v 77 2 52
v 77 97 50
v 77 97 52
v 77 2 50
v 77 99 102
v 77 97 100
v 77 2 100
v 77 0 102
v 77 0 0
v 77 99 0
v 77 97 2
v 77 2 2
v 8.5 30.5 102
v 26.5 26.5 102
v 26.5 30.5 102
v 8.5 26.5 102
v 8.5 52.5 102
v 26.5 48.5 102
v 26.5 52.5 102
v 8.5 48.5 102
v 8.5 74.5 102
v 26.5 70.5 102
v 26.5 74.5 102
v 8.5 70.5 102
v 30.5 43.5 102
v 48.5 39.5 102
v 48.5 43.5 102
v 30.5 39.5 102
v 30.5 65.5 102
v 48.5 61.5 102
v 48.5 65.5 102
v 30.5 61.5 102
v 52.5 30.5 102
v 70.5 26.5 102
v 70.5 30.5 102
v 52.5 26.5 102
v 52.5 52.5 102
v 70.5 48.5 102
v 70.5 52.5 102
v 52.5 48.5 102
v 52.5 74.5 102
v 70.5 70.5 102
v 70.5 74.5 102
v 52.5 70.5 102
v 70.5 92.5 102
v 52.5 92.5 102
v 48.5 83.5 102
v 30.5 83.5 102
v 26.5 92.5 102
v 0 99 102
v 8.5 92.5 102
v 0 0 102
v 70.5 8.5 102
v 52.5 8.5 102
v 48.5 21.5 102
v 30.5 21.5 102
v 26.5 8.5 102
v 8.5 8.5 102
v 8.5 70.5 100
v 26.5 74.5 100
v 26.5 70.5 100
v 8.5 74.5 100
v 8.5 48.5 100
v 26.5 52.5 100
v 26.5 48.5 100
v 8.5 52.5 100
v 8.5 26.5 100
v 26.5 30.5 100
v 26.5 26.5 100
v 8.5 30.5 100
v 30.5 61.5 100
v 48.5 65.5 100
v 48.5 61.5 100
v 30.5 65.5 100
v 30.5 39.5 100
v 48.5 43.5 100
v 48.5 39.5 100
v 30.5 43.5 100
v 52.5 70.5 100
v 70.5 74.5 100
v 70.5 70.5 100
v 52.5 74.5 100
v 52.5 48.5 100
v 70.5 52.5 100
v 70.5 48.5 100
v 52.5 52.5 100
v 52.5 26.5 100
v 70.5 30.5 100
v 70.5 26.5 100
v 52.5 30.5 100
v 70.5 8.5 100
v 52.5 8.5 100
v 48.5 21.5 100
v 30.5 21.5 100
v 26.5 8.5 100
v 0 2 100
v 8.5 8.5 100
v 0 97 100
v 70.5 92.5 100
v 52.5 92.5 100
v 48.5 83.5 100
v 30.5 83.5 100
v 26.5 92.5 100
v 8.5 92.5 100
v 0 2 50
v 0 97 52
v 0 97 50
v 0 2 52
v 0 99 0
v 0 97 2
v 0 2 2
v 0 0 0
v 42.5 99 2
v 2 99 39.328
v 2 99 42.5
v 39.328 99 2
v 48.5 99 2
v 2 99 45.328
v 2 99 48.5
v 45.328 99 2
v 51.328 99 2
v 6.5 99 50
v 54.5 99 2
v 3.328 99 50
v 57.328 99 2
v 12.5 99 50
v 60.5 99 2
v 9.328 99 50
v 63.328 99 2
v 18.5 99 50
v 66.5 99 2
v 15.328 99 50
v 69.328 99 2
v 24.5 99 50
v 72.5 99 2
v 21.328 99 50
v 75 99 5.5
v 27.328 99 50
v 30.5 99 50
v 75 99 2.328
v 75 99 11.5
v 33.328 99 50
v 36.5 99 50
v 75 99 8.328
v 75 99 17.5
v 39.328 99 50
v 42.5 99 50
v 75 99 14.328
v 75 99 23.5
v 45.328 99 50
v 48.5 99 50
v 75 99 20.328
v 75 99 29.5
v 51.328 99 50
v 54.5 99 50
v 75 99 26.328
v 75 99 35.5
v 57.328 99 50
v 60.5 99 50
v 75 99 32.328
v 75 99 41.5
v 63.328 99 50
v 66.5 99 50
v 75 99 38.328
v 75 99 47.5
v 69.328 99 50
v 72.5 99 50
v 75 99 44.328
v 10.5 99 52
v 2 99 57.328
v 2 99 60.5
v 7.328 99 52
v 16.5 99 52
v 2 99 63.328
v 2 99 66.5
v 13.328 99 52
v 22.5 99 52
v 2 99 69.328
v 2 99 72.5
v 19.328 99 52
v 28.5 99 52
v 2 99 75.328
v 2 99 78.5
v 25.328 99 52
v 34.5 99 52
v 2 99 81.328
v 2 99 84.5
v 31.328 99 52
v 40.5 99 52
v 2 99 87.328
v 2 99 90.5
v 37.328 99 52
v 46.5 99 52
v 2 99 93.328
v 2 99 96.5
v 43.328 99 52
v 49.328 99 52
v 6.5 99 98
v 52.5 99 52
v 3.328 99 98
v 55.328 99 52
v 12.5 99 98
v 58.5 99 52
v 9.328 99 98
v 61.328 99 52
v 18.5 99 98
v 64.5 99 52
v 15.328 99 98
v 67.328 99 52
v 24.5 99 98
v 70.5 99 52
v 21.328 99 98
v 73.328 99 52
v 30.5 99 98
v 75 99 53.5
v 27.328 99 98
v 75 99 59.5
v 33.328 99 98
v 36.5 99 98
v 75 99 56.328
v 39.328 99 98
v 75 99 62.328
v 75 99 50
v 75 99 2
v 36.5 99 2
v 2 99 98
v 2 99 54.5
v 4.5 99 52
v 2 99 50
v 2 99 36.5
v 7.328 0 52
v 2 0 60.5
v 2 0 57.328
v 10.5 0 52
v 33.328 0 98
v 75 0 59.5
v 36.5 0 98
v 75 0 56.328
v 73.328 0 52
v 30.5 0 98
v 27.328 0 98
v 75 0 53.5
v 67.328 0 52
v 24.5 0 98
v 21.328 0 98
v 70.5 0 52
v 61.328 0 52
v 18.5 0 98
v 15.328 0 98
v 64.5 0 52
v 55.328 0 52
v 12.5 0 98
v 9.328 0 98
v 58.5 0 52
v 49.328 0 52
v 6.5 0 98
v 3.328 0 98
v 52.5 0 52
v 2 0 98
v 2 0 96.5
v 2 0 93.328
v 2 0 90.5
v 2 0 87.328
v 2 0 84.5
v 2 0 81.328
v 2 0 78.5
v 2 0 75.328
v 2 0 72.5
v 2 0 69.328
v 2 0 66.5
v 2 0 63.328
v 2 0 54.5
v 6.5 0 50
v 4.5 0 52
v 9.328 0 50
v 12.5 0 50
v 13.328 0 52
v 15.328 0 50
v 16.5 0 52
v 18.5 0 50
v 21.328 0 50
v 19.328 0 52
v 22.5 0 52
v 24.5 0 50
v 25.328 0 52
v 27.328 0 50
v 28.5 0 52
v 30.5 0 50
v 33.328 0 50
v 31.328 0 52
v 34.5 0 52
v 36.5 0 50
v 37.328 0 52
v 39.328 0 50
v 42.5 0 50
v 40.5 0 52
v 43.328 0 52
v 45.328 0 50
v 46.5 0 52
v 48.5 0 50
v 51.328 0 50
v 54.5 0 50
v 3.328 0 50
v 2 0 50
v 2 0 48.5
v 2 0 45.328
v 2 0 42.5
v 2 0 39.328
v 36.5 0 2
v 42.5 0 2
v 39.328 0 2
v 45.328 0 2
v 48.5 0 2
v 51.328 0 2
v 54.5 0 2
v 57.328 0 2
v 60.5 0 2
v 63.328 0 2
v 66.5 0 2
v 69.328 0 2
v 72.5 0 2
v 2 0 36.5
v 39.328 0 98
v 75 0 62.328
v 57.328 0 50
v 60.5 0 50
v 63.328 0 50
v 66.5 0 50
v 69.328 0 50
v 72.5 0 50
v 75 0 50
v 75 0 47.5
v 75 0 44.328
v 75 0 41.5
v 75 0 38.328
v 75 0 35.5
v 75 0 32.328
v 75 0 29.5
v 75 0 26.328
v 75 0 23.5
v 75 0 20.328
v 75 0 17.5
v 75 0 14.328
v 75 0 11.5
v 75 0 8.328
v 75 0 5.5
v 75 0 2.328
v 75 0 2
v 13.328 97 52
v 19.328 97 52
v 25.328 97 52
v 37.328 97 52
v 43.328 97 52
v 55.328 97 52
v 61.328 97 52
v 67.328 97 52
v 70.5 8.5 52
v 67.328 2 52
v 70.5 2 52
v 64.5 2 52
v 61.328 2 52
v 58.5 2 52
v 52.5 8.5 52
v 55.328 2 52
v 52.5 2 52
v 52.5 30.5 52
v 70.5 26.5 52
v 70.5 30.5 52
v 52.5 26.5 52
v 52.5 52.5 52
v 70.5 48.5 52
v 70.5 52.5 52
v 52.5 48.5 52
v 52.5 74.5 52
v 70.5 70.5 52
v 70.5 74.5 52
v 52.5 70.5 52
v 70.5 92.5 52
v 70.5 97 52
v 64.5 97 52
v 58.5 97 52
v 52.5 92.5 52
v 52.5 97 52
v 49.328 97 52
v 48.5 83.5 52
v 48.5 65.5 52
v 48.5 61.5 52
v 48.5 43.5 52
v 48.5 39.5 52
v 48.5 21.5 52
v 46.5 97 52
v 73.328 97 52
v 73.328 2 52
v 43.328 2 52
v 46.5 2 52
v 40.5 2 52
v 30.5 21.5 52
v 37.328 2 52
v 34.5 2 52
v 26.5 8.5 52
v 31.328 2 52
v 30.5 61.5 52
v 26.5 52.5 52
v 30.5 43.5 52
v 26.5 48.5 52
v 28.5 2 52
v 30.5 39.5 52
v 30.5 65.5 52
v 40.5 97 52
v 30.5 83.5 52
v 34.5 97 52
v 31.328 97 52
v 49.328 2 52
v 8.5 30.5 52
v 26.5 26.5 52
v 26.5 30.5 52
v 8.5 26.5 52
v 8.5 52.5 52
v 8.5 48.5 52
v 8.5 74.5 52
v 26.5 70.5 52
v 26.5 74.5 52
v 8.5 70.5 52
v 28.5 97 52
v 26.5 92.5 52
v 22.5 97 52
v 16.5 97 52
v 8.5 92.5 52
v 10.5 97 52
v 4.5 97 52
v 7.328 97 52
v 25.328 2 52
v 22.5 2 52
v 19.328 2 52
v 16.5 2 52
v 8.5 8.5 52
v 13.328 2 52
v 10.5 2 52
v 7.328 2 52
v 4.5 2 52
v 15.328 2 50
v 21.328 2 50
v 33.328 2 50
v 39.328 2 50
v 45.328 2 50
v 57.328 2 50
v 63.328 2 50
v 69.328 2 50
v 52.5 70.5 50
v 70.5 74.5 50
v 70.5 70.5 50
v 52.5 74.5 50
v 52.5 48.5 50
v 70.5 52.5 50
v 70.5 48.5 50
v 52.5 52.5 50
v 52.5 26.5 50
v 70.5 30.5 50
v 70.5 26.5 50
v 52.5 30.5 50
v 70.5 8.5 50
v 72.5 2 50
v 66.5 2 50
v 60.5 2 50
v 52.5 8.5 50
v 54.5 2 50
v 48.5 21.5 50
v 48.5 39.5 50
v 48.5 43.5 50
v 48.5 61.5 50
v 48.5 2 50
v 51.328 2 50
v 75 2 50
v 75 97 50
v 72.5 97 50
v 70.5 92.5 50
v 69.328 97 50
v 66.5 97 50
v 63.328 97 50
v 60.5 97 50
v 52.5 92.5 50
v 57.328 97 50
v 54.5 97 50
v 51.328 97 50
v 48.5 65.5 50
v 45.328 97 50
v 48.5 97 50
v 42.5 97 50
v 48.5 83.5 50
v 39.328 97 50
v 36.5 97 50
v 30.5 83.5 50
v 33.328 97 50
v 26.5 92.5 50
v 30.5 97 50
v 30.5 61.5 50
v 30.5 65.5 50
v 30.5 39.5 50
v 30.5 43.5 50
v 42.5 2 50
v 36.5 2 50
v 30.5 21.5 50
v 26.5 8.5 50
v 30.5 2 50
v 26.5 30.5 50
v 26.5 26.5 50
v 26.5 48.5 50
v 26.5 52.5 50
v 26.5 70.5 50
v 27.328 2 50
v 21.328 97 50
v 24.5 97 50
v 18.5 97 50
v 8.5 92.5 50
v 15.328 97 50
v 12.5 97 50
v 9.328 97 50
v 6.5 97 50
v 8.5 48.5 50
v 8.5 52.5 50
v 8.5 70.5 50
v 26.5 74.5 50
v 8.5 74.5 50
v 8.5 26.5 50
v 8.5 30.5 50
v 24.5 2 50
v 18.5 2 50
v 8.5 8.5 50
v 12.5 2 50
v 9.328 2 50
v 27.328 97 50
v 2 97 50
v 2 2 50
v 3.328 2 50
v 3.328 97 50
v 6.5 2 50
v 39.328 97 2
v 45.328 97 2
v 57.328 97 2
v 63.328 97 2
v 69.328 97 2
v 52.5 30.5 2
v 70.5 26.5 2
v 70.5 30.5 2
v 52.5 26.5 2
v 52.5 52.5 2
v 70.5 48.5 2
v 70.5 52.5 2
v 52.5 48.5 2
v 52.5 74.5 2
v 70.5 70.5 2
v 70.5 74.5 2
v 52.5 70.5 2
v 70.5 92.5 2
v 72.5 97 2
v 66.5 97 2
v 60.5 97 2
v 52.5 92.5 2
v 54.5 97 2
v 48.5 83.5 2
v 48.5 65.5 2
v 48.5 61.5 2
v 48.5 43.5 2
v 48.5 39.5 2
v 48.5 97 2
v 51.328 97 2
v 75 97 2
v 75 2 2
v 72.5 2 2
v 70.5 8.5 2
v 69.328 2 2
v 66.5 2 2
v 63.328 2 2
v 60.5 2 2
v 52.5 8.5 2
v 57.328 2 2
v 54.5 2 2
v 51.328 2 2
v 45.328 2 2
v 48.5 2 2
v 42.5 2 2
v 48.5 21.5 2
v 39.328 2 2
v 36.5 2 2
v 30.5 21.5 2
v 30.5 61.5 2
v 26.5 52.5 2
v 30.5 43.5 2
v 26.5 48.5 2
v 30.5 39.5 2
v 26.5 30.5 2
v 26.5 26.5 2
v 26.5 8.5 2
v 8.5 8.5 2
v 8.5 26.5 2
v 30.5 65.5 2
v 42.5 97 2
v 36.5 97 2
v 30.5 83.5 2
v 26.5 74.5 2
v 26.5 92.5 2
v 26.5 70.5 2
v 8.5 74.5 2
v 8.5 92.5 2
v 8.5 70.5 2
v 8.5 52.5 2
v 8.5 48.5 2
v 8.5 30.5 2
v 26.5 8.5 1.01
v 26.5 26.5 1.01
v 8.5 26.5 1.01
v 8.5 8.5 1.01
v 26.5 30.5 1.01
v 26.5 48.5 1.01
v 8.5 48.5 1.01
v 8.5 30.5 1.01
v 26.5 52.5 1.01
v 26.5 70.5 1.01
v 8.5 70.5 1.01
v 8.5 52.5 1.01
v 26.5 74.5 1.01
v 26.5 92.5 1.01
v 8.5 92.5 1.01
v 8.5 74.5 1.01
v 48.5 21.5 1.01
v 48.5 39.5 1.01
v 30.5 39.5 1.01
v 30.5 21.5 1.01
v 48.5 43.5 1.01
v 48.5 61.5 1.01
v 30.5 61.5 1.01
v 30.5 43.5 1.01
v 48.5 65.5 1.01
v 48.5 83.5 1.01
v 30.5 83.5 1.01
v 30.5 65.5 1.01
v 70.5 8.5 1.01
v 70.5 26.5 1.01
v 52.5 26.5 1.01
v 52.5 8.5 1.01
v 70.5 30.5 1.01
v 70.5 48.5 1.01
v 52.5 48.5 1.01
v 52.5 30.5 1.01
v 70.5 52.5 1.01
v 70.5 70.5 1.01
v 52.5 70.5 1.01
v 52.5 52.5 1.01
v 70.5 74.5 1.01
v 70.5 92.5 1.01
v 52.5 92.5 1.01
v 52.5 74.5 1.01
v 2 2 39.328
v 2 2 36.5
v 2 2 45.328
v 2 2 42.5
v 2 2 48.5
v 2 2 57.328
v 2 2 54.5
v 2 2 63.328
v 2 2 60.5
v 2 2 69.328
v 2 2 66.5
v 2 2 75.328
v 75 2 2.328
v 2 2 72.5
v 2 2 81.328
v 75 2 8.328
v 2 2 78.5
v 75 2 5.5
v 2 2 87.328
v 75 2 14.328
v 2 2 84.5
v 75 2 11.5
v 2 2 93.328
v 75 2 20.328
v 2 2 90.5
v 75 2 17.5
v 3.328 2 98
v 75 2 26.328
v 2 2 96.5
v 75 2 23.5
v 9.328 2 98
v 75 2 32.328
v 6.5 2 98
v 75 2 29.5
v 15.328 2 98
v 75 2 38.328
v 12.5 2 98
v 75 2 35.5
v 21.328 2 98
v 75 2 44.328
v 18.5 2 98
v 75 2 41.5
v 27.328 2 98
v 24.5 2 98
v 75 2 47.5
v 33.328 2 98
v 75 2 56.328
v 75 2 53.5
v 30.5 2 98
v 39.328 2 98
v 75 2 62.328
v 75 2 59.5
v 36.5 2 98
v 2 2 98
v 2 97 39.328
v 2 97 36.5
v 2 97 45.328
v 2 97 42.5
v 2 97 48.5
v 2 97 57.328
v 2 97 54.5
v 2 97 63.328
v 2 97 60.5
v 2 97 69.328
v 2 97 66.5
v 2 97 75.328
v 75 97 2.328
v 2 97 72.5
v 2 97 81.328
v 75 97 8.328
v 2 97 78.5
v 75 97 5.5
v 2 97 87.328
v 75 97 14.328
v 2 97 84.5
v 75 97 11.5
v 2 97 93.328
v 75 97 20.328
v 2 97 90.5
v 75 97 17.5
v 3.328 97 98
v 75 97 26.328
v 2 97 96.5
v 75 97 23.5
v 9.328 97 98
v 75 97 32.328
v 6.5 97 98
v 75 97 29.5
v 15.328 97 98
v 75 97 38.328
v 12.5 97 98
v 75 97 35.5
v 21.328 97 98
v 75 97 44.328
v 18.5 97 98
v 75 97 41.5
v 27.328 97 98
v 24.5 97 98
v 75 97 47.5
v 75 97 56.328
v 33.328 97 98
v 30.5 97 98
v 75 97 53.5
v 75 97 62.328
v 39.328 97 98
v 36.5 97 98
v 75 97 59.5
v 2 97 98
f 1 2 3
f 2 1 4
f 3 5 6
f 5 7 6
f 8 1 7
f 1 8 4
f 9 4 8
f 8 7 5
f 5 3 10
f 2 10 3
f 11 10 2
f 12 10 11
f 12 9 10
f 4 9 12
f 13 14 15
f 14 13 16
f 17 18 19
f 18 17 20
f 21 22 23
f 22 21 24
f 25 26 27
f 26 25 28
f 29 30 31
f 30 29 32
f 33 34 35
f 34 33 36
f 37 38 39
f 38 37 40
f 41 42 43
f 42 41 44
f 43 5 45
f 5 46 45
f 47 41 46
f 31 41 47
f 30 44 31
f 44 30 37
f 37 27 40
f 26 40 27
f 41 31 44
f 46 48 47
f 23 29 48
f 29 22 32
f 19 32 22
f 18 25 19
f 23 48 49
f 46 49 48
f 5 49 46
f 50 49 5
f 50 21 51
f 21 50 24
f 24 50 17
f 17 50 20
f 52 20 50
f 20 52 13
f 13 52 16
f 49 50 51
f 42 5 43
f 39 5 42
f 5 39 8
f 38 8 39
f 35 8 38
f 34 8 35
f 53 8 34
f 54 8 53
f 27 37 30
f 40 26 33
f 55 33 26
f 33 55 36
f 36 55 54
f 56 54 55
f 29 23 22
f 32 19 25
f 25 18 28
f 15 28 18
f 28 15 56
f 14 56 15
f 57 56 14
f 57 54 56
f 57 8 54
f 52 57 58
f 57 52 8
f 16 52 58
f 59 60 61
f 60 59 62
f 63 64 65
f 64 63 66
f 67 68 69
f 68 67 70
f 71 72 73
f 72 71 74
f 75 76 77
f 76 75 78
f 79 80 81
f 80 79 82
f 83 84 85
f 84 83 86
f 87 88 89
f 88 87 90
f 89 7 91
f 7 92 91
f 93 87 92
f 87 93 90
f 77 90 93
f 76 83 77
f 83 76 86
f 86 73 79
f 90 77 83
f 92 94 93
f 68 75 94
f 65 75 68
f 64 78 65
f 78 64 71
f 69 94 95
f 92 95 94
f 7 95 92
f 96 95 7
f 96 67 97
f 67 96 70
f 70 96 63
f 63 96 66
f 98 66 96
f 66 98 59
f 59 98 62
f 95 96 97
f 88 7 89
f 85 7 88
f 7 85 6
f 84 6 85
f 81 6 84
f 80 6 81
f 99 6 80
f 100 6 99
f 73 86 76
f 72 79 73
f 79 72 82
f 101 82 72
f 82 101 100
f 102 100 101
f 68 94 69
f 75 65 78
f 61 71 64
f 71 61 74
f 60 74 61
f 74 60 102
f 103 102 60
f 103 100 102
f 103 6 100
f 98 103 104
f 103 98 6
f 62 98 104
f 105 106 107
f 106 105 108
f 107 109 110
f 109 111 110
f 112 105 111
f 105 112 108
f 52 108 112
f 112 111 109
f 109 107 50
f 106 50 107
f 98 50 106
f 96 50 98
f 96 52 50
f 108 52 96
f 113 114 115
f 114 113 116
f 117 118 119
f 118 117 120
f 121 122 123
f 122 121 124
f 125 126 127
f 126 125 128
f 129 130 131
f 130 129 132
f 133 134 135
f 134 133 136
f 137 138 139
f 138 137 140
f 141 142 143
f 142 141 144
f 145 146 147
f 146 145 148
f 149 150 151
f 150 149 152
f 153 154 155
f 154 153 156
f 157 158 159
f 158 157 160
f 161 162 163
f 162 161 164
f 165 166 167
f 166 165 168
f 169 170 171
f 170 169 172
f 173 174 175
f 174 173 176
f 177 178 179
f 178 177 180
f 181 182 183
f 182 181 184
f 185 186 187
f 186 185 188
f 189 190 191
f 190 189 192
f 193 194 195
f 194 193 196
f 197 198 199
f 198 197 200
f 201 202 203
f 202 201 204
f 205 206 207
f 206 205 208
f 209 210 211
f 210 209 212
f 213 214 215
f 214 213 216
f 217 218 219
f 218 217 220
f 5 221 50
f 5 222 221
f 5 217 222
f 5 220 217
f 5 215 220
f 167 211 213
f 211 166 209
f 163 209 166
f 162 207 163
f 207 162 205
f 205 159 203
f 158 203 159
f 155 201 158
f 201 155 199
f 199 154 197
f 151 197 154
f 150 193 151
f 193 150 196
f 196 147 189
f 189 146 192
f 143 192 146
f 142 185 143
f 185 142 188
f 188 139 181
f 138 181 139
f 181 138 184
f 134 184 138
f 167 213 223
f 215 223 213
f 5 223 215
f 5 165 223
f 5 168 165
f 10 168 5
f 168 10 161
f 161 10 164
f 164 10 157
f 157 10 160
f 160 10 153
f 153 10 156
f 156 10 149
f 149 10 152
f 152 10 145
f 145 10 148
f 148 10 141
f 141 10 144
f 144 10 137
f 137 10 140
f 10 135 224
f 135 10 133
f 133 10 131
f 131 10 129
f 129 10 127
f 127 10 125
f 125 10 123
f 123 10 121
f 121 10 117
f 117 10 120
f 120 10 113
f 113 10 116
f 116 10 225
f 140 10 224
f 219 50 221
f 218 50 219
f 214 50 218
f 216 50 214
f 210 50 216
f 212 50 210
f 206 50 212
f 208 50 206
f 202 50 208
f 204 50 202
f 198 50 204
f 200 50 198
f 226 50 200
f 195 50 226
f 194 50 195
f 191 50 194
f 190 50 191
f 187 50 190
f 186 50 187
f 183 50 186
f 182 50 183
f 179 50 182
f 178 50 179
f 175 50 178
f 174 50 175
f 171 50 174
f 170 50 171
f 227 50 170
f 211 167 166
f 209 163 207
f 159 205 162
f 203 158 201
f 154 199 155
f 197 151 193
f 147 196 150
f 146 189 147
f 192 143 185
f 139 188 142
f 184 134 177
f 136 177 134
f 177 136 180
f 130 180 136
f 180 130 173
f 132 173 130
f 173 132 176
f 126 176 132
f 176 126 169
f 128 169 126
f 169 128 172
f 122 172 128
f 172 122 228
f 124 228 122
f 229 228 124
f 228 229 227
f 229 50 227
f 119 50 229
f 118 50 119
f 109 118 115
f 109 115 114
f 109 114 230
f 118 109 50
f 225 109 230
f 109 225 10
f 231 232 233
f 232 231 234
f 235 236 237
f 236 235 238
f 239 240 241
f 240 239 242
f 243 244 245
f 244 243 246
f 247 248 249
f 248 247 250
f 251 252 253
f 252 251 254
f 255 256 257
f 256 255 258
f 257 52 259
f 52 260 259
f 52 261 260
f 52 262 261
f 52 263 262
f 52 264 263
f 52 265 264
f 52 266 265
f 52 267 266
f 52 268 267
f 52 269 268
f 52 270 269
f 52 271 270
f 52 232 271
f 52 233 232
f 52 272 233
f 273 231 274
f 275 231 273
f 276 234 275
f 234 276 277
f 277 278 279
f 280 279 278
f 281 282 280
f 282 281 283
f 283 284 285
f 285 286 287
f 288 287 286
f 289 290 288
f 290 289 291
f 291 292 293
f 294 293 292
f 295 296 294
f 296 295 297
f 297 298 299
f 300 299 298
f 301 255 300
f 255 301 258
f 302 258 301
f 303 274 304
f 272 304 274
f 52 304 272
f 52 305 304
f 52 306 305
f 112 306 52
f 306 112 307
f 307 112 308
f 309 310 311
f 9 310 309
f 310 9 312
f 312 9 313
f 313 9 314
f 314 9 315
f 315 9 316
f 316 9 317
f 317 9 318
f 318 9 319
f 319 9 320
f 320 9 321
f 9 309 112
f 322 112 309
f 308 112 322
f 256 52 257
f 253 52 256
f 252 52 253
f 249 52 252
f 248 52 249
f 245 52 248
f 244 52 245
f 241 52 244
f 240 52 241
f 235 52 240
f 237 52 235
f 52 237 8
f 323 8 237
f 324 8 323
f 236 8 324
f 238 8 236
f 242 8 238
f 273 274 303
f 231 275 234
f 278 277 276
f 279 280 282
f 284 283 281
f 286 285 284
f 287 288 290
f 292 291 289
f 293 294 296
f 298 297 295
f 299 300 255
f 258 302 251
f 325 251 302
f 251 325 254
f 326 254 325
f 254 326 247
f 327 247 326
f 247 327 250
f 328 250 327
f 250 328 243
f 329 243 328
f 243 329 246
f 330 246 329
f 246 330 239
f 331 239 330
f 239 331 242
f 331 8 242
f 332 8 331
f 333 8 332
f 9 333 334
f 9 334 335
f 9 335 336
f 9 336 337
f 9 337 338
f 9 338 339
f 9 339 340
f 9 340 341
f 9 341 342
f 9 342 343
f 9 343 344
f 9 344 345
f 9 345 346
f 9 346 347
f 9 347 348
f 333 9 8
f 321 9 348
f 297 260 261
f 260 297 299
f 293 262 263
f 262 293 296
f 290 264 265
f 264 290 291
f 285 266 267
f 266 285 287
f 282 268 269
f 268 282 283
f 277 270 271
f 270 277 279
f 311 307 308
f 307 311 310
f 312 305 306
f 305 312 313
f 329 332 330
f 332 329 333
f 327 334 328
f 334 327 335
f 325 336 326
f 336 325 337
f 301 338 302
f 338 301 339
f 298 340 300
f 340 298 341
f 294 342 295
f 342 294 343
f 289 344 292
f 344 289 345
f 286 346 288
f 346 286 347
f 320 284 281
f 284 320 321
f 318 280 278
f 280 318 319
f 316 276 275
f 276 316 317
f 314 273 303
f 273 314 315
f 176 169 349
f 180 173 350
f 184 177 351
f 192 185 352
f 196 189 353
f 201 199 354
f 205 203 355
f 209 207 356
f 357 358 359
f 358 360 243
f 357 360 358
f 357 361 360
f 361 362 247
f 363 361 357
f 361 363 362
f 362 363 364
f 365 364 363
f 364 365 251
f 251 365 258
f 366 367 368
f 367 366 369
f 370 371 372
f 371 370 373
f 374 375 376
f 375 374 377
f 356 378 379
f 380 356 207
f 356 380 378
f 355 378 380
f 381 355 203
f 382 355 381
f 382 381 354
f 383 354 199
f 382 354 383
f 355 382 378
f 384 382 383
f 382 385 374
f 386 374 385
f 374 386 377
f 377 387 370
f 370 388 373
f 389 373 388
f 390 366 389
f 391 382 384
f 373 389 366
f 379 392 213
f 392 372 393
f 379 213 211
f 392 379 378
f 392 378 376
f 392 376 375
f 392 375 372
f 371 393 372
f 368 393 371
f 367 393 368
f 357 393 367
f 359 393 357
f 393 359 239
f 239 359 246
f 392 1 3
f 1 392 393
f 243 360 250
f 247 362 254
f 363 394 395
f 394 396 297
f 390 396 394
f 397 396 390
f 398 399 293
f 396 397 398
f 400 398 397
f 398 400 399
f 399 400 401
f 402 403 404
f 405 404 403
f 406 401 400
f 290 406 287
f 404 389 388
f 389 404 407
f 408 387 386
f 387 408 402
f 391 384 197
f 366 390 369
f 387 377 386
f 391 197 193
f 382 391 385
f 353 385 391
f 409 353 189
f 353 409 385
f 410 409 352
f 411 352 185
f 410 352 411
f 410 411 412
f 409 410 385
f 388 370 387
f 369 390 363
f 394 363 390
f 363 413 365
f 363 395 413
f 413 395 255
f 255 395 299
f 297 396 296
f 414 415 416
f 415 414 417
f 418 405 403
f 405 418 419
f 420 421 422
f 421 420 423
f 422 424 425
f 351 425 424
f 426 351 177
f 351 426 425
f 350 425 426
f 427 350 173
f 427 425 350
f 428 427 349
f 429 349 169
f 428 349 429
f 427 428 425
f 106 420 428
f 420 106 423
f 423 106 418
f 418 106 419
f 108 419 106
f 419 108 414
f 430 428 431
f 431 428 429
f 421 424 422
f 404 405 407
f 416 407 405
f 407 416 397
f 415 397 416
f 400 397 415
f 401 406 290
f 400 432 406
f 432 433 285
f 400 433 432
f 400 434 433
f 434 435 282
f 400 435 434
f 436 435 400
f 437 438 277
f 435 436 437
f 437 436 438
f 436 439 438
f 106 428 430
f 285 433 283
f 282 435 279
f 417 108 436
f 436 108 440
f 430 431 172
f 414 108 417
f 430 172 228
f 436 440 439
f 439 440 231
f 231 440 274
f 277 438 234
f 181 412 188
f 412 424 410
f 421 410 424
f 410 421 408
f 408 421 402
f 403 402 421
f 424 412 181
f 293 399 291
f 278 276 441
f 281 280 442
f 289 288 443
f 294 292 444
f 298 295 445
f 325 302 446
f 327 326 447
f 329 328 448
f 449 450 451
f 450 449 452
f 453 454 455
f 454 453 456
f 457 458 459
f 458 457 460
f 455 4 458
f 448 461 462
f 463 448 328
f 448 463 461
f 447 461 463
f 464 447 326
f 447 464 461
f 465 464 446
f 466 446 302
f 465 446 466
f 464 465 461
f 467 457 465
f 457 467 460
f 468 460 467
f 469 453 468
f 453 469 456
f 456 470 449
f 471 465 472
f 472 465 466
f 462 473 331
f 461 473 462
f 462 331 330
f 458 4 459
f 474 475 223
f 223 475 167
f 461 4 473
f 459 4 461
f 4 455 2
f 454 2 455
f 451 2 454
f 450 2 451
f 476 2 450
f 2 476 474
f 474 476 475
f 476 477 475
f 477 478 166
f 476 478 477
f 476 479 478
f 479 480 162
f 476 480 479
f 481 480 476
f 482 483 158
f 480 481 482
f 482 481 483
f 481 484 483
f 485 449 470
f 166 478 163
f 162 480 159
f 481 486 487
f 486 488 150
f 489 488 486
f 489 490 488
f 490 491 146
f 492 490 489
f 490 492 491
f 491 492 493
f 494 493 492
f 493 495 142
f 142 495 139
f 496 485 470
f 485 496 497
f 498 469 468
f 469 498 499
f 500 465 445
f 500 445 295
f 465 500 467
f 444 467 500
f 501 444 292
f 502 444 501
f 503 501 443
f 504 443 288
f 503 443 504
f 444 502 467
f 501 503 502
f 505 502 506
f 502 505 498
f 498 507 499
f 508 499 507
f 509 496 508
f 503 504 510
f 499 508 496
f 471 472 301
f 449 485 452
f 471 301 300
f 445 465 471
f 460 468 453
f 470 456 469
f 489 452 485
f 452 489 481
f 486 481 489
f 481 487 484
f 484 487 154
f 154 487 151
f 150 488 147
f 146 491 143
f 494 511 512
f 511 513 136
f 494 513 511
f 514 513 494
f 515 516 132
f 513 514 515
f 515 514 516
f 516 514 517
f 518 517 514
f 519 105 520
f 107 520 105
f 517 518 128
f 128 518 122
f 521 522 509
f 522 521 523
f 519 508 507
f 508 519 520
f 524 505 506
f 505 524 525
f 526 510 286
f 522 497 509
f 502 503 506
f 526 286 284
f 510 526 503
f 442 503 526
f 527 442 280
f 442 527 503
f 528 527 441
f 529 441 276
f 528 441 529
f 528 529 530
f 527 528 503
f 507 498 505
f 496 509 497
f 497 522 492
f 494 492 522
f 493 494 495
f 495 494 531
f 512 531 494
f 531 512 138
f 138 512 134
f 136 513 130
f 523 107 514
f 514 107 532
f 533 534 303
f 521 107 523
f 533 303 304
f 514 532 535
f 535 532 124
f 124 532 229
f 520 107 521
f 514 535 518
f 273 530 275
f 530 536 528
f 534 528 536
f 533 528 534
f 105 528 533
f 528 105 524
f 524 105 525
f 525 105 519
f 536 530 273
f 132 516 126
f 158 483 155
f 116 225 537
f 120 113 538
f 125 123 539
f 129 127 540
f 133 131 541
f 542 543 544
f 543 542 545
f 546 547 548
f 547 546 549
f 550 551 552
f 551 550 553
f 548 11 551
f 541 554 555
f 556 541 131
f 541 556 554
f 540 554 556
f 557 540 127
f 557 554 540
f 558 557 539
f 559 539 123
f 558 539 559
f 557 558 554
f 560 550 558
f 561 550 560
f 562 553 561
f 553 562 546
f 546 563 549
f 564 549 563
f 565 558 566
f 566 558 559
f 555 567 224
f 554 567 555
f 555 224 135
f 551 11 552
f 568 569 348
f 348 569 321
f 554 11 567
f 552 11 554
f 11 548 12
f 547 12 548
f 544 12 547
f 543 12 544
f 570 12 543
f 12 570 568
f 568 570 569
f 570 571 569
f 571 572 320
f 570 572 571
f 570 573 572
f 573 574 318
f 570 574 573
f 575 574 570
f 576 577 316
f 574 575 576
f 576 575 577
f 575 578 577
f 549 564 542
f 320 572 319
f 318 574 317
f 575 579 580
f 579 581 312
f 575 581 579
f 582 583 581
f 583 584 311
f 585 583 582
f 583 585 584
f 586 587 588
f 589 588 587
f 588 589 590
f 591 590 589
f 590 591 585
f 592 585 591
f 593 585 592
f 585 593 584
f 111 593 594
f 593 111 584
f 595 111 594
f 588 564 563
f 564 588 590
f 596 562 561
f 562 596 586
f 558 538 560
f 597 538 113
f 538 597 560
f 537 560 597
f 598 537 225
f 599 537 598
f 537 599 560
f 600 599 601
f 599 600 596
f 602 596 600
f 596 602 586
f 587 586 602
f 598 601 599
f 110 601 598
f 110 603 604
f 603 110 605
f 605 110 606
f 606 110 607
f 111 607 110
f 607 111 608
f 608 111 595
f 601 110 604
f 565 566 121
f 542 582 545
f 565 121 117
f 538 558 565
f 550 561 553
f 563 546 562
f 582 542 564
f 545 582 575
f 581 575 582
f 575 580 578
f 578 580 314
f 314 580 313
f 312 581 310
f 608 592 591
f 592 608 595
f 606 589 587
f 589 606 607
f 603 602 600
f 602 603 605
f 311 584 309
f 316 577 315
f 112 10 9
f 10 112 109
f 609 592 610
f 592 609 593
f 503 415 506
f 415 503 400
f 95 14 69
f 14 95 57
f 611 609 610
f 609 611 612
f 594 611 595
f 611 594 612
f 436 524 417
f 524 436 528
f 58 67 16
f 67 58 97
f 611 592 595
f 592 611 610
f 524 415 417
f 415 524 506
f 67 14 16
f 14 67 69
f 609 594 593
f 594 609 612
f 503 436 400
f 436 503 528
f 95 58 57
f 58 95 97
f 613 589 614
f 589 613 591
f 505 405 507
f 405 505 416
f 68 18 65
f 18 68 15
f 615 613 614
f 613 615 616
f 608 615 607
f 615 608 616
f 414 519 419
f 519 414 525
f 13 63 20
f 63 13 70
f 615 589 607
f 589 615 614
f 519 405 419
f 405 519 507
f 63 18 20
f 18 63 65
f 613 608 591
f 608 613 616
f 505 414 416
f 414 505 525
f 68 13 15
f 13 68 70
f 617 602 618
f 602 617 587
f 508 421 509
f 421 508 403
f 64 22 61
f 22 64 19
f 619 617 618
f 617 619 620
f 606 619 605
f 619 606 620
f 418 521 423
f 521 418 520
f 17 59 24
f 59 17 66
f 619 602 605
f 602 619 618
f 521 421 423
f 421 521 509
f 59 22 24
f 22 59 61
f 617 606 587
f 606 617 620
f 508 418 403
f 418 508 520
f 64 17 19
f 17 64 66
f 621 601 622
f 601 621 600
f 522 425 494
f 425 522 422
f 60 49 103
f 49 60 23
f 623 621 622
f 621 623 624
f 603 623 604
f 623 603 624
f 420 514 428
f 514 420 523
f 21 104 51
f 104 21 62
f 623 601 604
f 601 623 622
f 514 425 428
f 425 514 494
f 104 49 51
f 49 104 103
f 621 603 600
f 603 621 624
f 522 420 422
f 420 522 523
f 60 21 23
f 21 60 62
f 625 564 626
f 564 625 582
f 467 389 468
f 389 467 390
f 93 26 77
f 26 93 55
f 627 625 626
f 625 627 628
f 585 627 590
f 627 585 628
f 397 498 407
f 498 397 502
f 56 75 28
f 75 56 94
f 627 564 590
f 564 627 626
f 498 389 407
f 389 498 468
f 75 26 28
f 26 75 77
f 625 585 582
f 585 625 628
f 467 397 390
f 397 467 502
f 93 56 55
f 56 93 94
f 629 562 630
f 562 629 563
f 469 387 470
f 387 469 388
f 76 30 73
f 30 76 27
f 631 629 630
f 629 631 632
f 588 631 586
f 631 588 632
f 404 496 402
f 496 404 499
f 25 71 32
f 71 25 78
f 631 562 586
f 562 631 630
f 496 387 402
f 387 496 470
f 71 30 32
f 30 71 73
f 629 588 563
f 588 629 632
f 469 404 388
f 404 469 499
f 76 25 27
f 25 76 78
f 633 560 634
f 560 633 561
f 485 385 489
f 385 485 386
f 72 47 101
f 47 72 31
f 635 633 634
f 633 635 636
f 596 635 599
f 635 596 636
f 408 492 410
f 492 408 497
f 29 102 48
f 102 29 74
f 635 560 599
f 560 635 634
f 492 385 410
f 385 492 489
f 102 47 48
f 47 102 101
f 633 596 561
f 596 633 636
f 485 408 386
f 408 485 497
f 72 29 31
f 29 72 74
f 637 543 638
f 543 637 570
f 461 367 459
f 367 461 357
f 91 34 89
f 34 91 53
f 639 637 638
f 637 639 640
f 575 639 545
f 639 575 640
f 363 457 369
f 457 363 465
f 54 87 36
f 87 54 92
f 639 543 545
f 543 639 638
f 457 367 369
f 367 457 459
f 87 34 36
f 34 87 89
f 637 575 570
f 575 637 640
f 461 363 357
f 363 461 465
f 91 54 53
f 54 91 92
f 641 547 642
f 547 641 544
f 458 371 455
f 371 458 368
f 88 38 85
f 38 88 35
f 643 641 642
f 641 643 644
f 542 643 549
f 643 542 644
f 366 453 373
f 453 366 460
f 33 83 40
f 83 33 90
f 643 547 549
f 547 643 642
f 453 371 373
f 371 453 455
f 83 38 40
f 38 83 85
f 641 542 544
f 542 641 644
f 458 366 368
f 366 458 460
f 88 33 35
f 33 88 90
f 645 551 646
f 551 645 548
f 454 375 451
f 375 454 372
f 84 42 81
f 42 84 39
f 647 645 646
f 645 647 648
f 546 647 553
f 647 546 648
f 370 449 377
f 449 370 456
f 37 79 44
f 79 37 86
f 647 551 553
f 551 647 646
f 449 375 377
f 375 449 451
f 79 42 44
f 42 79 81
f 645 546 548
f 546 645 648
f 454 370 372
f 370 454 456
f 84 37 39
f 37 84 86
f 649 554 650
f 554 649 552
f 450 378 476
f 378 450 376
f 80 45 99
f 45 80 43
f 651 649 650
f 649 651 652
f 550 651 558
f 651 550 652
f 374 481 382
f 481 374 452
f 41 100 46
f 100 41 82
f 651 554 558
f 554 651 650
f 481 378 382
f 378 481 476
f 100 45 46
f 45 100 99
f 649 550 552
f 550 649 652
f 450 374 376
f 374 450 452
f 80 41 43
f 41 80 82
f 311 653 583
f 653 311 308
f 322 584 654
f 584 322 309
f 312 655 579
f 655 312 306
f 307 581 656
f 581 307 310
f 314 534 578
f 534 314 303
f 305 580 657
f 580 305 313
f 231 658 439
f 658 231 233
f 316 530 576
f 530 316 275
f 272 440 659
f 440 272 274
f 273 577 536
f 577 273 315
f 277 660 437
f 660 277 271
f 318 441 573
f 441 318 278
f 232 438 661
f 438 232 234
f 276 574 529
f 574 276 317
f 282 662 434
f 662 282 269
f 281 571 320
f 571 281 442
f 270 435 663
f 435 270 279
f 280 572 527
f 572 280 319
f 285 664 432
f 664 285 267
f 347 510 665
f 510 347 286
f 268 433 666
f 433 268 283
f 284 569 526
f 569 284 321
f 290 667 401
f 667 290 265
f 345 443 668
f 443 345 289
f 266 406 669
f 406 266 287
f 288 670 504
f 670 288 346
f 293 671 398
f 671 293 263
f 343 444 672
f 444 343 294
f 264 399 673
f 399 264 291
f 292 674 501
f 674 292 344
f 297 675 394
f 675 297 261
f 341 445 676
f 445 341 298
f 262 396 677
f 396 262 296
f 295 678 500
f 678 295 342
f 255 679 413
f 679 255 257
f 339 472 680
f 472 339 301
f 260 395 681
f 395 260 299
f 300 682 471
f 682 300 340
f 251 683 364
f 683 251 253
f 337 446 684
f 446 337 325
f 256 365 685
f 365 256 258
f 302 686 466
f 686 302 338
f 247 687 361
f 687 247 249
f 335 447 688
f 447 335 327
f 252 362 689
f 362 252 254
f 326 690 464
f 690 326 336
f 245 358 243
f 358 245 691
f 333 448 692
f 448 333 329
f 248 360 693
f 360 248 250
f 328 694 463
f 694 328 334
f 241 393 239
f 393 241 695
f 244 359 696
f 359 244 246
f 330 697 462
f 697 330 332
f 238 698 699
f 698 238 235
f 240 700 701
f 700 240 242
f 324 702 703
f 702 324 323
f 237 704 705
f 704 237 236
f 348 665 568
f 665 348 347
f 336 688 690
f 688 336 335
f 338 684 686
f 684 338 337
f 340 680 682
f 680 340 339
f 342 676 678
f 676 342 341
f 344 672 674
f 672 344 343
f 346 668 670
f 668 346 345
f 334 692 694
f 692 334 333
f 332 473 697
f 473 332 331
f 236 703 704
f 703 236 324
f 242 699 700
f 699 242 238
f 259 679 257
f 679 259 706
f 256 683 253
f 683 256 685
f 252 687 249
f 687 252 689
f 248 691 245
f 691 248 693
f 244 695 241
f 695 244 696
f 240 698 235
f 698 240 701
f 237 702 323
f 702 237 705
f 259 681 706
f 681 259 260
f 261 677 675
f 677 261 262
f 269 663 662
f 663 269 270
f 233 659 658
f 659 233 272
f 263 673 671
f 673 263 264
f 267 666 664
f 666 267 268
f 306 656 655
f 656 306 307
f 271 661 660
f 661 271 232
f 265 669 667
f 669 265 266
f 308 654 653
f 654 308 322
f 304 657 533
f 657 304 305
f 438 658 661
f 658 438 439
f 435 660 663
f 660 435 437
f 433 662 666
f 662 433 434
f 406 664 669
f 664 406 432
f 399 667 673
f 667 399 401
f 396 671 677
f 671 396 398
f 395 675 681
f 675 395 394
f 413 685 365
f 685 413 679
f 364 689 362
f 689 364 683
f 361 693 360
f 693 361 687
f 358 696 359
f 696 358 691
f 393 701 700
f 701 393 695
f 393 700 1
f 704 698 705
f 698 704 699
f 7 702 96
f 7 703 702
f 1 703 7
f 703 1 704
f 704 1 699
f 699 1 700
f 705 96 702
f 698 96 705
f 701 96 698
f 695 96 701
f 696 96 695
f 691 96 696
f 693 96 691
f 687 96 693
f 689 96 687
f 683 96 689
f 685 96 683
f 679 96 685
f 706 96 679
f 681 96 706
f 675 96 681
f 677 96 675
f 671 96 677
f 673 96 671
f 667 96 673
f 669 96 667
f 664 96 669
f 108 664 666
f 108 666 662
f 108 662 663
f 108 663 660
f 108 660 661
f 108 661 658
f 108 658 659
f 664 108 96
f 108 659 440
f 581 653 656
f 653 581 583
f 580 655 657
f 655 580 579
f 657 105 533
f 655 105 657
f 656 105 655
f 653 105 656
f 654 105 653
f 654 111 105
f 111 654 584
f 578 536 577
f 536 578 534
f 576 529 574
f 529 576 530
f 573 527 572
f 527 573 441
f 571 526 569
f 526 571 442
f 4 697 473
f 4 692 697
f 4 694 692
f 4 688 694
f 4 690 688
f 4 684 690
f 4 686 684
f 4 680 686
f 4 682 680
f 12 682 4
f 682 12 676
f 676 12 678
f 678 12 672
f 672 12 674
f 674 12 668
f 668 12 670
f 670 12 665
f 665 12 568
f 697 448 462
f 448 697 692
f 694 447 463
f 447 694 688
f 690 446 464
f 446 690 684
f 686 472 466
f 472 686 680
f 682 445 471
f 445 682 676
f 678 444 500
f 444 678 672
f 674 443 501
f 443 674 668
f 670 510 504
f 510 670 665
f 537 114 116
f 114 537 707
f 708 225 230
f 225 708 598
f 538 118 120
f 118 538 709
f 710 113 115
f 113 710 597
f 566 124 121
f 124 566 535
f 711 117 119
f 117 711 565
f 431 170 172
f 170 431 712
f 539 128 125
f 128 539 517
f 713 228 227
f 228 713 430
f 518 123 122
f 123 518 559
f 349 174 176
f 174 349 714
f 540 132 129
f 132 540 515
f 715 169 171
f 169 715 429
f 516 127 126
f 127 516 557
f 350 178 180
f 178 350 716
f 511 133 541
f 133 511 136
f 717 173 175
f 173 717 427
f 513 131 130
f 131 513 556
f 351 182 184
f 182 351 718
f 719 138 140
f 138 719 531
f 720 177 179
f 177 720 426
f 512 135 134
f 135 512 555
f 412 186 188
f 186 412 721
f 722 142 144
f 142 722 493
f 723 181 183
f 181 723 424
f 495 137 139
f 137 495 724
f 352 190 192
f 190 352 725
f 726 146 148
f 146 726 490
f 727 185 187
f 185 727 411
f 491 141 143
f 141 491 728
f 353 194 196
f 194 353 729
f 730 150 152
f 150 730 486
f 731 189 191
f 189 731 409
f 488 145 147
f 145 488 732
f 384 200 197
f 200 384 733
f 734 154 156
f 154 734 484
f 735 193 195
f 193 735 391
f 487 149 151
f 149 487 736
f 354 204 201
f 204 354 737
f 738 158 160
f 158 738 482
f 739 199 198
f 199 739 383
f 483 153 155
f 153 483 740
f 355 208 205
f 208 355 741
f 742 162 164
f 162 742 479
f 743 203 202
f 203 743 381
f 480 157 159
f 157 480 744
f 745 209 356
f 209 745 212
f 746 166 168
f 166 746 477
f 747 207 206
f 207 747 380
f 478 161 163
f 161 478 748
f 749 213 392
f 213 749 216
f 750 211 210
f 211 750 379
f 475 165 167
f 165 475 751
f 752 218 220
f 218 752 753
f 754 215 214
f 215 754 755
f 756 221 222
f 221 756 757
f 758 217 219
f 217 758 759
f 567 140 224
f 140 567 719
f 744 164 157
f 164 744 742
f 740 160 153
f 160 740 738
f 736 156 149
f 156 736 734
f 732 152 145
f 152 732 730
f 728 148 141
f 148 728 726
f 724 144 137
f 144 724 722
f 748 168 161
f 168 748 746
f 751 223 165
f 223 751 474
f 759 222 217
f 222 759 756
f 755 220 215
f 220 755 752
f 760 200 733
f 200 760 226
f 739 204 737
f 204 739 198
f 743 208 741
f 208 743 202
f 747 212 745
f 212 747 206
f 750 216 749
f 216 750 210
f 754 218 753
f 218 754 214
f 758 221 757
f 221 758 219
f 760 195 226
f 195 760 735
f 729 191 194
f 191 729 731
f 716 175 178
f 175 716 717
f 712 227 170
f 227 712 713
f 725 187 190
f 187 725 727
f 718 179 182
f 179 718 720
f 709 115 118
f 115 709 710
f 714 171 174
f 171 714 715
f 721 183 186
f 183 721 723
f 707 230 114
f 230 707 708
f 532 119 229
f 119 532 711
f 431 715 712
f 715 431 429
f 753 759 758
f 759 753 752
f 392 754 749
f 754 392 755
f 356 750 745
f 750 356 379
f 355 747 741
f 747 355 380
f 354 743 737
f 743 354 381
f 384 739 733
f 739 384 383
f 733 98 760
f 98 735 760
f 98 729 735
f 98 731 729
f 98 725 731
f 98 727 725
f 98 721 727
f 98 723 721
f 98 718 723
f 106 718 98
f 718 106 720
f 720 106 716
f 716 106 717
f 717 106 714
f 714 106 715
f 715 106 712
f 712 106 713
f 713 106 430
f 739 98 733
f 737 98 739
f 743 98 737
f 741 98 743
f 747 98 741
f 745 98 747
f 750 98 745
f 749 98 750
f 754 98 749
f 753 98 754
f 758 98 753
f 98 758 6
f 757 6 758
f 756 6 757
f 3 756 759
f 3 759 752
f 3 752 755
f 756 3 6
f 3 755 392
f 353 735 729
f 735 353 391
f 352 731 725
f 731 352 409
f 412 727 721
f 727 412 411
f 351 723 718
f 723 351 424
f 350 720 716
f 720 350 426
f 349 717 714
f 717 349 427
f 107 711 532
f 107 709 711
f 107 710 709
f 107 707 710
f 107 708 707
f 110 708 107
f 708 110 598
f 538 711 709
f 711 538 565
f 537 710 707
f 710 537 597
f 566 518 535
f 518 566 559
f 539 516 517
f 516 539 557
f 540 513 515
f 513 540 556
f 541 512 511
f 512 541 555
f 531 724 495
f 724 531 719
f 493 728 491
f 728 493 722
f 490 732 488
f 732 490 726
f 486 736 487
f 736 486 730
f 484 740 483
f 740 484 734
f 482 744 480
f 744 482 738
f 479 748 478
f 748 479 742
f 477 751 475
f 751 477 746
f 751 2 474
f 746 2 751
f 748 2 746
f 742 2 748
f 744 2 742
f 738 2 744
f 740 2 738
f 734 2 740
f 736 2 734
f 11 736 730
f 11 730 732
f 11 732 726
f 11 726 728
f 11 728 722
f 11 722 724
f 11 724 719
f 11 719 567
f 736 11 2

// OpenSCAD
// Number of Tubes at X axis
TubesX = 3;
// Number of Tubes at Y axis
TubesY = 4;
// Tube Height
TubeHeight = 150;
// Tube diameter
TubeDiameter = 16;
// Hole diameter
HoleDiameter = 18;
// Top table height
HolderHeight = 100;
// Walls thickness
HolderThickness = 2; // [2:50]
// Zero to remove
SecondTableHeight = 50;
// Inter tube space
InterTubeSpace = 4; // [2:50]
// Alternate even rows positions ?
AlternateEvenRows = "Yes"; // [Yes,No]
// Draw Sample Tubes?
DrawSampleTubes = "No";  // [Yes,No]
// Make half hole at bottom table?
MakeHalfHoleBottom = "Yes"; // [Yes,No]
DrawHatchOnWalls = "Yes"; // [Yes,No]
MakeSquaredHoles = "Yes"; // [Yes,No]
       
/* [HIDDEN] */
$fn=50;
bAlternateEvenRows = "Yes" == AlternateEvenRows; // Alternate even rows positions
bDrawSampleTubes = "Yes" == DrawSampleTubes;  // Draw Sample Tubes?
bMakeHalfHoleBottom ="Yes" == MakeHalfHoleBottom; // Make half hole at bottmo table?

modelX = (TubesX+0.5)*(HoleDiameter+InterTubeSpace);
modelY = (TubesY+0.5)*(HoleDiameter+InterTubeSpace);

holderThickness = HolderThickness < 2 ? 2: HolderThickness;

//wall();
All();

module All(){
    difference()
    {
        union(){
            translate([0,0,HolderHeight]) table();
            translate([0,0,SecondTableHeight]) table();
            table();
        }
        z = bMakeHalfHoleBottom ? (holderThickness/2) : 0;
        translate([0,0,0.01 + holderThickness-z]) // Better Drawing
            DrawTubes();
    }
    wall();
    translate([0,
              modelY-holderThickness,
              0])
        wall();
    if(bDrawSampleTubes)
        DrawTubes(TubeDiameter);
}
module wall(){
    if("Yes" == DrawHatchOnWalls){
        difference(){
            cube([modelX,
                  holderThickness,
                  HolderHeight]);
            intersection(){
                wallPatternRestriction();
                patternDiagonal();
            }
        }    
    }else{
        cube([modelX,
              holderThickness,
              HolderHeight]);
    }
}
module wallPatternRestriction(){
    translate([holderThickness,-holderThickness*0.5,holderThickness])
        cube([modelX-2*holderThickness,
              holderThickness*2,
              HolderHeight-2*holderThickness]);
}
module patternDiagonal(){
    for(i = [0:holderThickness*3:HolderHeight]){
        translate([0,-1,modelX/2+i]) rotate([0,45,0])
            cube([modelX*2,holderThickness*2,holderThickness]);
    }
}
module table(){
    cube([modelX,
          modelY,
          holderThickness]);
}
module DrawTubes(Diameter = HoleDiameter){
    color("lightblue")
    for(x = [1:TubesX])
    {    
        alternate = (x%2 == 0 && bAlternateEvenRows);
        for(y = [1: alternate ? TubesY-1:TubesY])
        {            
            offsetY = alternate ? (InterTubeSpace+HoleDiameter/2) : 0;
            
            if("Yes" == MakeSquaredHoles){
                translate([x*(HoleDiameter+InterTubeSpace)-HoleDiameter*0.75,
                       offsetY+y*(HoleDiameter+InterTubeSpace)-HoleDiameter*0.75,0])
                cube([Diameter,Diameter,TubeHeight]);
            }else{
                translate([x*(HoleDiameter+InterTubeSpace)-HoleDiameter/4,
                       offsetY+y*(HoleDiameter+InterTubeSpace)-HoleDiameter/4,0])
                cylinder(r = Diameter/2,h=TubeHeight);
            }
        }
    }
}
